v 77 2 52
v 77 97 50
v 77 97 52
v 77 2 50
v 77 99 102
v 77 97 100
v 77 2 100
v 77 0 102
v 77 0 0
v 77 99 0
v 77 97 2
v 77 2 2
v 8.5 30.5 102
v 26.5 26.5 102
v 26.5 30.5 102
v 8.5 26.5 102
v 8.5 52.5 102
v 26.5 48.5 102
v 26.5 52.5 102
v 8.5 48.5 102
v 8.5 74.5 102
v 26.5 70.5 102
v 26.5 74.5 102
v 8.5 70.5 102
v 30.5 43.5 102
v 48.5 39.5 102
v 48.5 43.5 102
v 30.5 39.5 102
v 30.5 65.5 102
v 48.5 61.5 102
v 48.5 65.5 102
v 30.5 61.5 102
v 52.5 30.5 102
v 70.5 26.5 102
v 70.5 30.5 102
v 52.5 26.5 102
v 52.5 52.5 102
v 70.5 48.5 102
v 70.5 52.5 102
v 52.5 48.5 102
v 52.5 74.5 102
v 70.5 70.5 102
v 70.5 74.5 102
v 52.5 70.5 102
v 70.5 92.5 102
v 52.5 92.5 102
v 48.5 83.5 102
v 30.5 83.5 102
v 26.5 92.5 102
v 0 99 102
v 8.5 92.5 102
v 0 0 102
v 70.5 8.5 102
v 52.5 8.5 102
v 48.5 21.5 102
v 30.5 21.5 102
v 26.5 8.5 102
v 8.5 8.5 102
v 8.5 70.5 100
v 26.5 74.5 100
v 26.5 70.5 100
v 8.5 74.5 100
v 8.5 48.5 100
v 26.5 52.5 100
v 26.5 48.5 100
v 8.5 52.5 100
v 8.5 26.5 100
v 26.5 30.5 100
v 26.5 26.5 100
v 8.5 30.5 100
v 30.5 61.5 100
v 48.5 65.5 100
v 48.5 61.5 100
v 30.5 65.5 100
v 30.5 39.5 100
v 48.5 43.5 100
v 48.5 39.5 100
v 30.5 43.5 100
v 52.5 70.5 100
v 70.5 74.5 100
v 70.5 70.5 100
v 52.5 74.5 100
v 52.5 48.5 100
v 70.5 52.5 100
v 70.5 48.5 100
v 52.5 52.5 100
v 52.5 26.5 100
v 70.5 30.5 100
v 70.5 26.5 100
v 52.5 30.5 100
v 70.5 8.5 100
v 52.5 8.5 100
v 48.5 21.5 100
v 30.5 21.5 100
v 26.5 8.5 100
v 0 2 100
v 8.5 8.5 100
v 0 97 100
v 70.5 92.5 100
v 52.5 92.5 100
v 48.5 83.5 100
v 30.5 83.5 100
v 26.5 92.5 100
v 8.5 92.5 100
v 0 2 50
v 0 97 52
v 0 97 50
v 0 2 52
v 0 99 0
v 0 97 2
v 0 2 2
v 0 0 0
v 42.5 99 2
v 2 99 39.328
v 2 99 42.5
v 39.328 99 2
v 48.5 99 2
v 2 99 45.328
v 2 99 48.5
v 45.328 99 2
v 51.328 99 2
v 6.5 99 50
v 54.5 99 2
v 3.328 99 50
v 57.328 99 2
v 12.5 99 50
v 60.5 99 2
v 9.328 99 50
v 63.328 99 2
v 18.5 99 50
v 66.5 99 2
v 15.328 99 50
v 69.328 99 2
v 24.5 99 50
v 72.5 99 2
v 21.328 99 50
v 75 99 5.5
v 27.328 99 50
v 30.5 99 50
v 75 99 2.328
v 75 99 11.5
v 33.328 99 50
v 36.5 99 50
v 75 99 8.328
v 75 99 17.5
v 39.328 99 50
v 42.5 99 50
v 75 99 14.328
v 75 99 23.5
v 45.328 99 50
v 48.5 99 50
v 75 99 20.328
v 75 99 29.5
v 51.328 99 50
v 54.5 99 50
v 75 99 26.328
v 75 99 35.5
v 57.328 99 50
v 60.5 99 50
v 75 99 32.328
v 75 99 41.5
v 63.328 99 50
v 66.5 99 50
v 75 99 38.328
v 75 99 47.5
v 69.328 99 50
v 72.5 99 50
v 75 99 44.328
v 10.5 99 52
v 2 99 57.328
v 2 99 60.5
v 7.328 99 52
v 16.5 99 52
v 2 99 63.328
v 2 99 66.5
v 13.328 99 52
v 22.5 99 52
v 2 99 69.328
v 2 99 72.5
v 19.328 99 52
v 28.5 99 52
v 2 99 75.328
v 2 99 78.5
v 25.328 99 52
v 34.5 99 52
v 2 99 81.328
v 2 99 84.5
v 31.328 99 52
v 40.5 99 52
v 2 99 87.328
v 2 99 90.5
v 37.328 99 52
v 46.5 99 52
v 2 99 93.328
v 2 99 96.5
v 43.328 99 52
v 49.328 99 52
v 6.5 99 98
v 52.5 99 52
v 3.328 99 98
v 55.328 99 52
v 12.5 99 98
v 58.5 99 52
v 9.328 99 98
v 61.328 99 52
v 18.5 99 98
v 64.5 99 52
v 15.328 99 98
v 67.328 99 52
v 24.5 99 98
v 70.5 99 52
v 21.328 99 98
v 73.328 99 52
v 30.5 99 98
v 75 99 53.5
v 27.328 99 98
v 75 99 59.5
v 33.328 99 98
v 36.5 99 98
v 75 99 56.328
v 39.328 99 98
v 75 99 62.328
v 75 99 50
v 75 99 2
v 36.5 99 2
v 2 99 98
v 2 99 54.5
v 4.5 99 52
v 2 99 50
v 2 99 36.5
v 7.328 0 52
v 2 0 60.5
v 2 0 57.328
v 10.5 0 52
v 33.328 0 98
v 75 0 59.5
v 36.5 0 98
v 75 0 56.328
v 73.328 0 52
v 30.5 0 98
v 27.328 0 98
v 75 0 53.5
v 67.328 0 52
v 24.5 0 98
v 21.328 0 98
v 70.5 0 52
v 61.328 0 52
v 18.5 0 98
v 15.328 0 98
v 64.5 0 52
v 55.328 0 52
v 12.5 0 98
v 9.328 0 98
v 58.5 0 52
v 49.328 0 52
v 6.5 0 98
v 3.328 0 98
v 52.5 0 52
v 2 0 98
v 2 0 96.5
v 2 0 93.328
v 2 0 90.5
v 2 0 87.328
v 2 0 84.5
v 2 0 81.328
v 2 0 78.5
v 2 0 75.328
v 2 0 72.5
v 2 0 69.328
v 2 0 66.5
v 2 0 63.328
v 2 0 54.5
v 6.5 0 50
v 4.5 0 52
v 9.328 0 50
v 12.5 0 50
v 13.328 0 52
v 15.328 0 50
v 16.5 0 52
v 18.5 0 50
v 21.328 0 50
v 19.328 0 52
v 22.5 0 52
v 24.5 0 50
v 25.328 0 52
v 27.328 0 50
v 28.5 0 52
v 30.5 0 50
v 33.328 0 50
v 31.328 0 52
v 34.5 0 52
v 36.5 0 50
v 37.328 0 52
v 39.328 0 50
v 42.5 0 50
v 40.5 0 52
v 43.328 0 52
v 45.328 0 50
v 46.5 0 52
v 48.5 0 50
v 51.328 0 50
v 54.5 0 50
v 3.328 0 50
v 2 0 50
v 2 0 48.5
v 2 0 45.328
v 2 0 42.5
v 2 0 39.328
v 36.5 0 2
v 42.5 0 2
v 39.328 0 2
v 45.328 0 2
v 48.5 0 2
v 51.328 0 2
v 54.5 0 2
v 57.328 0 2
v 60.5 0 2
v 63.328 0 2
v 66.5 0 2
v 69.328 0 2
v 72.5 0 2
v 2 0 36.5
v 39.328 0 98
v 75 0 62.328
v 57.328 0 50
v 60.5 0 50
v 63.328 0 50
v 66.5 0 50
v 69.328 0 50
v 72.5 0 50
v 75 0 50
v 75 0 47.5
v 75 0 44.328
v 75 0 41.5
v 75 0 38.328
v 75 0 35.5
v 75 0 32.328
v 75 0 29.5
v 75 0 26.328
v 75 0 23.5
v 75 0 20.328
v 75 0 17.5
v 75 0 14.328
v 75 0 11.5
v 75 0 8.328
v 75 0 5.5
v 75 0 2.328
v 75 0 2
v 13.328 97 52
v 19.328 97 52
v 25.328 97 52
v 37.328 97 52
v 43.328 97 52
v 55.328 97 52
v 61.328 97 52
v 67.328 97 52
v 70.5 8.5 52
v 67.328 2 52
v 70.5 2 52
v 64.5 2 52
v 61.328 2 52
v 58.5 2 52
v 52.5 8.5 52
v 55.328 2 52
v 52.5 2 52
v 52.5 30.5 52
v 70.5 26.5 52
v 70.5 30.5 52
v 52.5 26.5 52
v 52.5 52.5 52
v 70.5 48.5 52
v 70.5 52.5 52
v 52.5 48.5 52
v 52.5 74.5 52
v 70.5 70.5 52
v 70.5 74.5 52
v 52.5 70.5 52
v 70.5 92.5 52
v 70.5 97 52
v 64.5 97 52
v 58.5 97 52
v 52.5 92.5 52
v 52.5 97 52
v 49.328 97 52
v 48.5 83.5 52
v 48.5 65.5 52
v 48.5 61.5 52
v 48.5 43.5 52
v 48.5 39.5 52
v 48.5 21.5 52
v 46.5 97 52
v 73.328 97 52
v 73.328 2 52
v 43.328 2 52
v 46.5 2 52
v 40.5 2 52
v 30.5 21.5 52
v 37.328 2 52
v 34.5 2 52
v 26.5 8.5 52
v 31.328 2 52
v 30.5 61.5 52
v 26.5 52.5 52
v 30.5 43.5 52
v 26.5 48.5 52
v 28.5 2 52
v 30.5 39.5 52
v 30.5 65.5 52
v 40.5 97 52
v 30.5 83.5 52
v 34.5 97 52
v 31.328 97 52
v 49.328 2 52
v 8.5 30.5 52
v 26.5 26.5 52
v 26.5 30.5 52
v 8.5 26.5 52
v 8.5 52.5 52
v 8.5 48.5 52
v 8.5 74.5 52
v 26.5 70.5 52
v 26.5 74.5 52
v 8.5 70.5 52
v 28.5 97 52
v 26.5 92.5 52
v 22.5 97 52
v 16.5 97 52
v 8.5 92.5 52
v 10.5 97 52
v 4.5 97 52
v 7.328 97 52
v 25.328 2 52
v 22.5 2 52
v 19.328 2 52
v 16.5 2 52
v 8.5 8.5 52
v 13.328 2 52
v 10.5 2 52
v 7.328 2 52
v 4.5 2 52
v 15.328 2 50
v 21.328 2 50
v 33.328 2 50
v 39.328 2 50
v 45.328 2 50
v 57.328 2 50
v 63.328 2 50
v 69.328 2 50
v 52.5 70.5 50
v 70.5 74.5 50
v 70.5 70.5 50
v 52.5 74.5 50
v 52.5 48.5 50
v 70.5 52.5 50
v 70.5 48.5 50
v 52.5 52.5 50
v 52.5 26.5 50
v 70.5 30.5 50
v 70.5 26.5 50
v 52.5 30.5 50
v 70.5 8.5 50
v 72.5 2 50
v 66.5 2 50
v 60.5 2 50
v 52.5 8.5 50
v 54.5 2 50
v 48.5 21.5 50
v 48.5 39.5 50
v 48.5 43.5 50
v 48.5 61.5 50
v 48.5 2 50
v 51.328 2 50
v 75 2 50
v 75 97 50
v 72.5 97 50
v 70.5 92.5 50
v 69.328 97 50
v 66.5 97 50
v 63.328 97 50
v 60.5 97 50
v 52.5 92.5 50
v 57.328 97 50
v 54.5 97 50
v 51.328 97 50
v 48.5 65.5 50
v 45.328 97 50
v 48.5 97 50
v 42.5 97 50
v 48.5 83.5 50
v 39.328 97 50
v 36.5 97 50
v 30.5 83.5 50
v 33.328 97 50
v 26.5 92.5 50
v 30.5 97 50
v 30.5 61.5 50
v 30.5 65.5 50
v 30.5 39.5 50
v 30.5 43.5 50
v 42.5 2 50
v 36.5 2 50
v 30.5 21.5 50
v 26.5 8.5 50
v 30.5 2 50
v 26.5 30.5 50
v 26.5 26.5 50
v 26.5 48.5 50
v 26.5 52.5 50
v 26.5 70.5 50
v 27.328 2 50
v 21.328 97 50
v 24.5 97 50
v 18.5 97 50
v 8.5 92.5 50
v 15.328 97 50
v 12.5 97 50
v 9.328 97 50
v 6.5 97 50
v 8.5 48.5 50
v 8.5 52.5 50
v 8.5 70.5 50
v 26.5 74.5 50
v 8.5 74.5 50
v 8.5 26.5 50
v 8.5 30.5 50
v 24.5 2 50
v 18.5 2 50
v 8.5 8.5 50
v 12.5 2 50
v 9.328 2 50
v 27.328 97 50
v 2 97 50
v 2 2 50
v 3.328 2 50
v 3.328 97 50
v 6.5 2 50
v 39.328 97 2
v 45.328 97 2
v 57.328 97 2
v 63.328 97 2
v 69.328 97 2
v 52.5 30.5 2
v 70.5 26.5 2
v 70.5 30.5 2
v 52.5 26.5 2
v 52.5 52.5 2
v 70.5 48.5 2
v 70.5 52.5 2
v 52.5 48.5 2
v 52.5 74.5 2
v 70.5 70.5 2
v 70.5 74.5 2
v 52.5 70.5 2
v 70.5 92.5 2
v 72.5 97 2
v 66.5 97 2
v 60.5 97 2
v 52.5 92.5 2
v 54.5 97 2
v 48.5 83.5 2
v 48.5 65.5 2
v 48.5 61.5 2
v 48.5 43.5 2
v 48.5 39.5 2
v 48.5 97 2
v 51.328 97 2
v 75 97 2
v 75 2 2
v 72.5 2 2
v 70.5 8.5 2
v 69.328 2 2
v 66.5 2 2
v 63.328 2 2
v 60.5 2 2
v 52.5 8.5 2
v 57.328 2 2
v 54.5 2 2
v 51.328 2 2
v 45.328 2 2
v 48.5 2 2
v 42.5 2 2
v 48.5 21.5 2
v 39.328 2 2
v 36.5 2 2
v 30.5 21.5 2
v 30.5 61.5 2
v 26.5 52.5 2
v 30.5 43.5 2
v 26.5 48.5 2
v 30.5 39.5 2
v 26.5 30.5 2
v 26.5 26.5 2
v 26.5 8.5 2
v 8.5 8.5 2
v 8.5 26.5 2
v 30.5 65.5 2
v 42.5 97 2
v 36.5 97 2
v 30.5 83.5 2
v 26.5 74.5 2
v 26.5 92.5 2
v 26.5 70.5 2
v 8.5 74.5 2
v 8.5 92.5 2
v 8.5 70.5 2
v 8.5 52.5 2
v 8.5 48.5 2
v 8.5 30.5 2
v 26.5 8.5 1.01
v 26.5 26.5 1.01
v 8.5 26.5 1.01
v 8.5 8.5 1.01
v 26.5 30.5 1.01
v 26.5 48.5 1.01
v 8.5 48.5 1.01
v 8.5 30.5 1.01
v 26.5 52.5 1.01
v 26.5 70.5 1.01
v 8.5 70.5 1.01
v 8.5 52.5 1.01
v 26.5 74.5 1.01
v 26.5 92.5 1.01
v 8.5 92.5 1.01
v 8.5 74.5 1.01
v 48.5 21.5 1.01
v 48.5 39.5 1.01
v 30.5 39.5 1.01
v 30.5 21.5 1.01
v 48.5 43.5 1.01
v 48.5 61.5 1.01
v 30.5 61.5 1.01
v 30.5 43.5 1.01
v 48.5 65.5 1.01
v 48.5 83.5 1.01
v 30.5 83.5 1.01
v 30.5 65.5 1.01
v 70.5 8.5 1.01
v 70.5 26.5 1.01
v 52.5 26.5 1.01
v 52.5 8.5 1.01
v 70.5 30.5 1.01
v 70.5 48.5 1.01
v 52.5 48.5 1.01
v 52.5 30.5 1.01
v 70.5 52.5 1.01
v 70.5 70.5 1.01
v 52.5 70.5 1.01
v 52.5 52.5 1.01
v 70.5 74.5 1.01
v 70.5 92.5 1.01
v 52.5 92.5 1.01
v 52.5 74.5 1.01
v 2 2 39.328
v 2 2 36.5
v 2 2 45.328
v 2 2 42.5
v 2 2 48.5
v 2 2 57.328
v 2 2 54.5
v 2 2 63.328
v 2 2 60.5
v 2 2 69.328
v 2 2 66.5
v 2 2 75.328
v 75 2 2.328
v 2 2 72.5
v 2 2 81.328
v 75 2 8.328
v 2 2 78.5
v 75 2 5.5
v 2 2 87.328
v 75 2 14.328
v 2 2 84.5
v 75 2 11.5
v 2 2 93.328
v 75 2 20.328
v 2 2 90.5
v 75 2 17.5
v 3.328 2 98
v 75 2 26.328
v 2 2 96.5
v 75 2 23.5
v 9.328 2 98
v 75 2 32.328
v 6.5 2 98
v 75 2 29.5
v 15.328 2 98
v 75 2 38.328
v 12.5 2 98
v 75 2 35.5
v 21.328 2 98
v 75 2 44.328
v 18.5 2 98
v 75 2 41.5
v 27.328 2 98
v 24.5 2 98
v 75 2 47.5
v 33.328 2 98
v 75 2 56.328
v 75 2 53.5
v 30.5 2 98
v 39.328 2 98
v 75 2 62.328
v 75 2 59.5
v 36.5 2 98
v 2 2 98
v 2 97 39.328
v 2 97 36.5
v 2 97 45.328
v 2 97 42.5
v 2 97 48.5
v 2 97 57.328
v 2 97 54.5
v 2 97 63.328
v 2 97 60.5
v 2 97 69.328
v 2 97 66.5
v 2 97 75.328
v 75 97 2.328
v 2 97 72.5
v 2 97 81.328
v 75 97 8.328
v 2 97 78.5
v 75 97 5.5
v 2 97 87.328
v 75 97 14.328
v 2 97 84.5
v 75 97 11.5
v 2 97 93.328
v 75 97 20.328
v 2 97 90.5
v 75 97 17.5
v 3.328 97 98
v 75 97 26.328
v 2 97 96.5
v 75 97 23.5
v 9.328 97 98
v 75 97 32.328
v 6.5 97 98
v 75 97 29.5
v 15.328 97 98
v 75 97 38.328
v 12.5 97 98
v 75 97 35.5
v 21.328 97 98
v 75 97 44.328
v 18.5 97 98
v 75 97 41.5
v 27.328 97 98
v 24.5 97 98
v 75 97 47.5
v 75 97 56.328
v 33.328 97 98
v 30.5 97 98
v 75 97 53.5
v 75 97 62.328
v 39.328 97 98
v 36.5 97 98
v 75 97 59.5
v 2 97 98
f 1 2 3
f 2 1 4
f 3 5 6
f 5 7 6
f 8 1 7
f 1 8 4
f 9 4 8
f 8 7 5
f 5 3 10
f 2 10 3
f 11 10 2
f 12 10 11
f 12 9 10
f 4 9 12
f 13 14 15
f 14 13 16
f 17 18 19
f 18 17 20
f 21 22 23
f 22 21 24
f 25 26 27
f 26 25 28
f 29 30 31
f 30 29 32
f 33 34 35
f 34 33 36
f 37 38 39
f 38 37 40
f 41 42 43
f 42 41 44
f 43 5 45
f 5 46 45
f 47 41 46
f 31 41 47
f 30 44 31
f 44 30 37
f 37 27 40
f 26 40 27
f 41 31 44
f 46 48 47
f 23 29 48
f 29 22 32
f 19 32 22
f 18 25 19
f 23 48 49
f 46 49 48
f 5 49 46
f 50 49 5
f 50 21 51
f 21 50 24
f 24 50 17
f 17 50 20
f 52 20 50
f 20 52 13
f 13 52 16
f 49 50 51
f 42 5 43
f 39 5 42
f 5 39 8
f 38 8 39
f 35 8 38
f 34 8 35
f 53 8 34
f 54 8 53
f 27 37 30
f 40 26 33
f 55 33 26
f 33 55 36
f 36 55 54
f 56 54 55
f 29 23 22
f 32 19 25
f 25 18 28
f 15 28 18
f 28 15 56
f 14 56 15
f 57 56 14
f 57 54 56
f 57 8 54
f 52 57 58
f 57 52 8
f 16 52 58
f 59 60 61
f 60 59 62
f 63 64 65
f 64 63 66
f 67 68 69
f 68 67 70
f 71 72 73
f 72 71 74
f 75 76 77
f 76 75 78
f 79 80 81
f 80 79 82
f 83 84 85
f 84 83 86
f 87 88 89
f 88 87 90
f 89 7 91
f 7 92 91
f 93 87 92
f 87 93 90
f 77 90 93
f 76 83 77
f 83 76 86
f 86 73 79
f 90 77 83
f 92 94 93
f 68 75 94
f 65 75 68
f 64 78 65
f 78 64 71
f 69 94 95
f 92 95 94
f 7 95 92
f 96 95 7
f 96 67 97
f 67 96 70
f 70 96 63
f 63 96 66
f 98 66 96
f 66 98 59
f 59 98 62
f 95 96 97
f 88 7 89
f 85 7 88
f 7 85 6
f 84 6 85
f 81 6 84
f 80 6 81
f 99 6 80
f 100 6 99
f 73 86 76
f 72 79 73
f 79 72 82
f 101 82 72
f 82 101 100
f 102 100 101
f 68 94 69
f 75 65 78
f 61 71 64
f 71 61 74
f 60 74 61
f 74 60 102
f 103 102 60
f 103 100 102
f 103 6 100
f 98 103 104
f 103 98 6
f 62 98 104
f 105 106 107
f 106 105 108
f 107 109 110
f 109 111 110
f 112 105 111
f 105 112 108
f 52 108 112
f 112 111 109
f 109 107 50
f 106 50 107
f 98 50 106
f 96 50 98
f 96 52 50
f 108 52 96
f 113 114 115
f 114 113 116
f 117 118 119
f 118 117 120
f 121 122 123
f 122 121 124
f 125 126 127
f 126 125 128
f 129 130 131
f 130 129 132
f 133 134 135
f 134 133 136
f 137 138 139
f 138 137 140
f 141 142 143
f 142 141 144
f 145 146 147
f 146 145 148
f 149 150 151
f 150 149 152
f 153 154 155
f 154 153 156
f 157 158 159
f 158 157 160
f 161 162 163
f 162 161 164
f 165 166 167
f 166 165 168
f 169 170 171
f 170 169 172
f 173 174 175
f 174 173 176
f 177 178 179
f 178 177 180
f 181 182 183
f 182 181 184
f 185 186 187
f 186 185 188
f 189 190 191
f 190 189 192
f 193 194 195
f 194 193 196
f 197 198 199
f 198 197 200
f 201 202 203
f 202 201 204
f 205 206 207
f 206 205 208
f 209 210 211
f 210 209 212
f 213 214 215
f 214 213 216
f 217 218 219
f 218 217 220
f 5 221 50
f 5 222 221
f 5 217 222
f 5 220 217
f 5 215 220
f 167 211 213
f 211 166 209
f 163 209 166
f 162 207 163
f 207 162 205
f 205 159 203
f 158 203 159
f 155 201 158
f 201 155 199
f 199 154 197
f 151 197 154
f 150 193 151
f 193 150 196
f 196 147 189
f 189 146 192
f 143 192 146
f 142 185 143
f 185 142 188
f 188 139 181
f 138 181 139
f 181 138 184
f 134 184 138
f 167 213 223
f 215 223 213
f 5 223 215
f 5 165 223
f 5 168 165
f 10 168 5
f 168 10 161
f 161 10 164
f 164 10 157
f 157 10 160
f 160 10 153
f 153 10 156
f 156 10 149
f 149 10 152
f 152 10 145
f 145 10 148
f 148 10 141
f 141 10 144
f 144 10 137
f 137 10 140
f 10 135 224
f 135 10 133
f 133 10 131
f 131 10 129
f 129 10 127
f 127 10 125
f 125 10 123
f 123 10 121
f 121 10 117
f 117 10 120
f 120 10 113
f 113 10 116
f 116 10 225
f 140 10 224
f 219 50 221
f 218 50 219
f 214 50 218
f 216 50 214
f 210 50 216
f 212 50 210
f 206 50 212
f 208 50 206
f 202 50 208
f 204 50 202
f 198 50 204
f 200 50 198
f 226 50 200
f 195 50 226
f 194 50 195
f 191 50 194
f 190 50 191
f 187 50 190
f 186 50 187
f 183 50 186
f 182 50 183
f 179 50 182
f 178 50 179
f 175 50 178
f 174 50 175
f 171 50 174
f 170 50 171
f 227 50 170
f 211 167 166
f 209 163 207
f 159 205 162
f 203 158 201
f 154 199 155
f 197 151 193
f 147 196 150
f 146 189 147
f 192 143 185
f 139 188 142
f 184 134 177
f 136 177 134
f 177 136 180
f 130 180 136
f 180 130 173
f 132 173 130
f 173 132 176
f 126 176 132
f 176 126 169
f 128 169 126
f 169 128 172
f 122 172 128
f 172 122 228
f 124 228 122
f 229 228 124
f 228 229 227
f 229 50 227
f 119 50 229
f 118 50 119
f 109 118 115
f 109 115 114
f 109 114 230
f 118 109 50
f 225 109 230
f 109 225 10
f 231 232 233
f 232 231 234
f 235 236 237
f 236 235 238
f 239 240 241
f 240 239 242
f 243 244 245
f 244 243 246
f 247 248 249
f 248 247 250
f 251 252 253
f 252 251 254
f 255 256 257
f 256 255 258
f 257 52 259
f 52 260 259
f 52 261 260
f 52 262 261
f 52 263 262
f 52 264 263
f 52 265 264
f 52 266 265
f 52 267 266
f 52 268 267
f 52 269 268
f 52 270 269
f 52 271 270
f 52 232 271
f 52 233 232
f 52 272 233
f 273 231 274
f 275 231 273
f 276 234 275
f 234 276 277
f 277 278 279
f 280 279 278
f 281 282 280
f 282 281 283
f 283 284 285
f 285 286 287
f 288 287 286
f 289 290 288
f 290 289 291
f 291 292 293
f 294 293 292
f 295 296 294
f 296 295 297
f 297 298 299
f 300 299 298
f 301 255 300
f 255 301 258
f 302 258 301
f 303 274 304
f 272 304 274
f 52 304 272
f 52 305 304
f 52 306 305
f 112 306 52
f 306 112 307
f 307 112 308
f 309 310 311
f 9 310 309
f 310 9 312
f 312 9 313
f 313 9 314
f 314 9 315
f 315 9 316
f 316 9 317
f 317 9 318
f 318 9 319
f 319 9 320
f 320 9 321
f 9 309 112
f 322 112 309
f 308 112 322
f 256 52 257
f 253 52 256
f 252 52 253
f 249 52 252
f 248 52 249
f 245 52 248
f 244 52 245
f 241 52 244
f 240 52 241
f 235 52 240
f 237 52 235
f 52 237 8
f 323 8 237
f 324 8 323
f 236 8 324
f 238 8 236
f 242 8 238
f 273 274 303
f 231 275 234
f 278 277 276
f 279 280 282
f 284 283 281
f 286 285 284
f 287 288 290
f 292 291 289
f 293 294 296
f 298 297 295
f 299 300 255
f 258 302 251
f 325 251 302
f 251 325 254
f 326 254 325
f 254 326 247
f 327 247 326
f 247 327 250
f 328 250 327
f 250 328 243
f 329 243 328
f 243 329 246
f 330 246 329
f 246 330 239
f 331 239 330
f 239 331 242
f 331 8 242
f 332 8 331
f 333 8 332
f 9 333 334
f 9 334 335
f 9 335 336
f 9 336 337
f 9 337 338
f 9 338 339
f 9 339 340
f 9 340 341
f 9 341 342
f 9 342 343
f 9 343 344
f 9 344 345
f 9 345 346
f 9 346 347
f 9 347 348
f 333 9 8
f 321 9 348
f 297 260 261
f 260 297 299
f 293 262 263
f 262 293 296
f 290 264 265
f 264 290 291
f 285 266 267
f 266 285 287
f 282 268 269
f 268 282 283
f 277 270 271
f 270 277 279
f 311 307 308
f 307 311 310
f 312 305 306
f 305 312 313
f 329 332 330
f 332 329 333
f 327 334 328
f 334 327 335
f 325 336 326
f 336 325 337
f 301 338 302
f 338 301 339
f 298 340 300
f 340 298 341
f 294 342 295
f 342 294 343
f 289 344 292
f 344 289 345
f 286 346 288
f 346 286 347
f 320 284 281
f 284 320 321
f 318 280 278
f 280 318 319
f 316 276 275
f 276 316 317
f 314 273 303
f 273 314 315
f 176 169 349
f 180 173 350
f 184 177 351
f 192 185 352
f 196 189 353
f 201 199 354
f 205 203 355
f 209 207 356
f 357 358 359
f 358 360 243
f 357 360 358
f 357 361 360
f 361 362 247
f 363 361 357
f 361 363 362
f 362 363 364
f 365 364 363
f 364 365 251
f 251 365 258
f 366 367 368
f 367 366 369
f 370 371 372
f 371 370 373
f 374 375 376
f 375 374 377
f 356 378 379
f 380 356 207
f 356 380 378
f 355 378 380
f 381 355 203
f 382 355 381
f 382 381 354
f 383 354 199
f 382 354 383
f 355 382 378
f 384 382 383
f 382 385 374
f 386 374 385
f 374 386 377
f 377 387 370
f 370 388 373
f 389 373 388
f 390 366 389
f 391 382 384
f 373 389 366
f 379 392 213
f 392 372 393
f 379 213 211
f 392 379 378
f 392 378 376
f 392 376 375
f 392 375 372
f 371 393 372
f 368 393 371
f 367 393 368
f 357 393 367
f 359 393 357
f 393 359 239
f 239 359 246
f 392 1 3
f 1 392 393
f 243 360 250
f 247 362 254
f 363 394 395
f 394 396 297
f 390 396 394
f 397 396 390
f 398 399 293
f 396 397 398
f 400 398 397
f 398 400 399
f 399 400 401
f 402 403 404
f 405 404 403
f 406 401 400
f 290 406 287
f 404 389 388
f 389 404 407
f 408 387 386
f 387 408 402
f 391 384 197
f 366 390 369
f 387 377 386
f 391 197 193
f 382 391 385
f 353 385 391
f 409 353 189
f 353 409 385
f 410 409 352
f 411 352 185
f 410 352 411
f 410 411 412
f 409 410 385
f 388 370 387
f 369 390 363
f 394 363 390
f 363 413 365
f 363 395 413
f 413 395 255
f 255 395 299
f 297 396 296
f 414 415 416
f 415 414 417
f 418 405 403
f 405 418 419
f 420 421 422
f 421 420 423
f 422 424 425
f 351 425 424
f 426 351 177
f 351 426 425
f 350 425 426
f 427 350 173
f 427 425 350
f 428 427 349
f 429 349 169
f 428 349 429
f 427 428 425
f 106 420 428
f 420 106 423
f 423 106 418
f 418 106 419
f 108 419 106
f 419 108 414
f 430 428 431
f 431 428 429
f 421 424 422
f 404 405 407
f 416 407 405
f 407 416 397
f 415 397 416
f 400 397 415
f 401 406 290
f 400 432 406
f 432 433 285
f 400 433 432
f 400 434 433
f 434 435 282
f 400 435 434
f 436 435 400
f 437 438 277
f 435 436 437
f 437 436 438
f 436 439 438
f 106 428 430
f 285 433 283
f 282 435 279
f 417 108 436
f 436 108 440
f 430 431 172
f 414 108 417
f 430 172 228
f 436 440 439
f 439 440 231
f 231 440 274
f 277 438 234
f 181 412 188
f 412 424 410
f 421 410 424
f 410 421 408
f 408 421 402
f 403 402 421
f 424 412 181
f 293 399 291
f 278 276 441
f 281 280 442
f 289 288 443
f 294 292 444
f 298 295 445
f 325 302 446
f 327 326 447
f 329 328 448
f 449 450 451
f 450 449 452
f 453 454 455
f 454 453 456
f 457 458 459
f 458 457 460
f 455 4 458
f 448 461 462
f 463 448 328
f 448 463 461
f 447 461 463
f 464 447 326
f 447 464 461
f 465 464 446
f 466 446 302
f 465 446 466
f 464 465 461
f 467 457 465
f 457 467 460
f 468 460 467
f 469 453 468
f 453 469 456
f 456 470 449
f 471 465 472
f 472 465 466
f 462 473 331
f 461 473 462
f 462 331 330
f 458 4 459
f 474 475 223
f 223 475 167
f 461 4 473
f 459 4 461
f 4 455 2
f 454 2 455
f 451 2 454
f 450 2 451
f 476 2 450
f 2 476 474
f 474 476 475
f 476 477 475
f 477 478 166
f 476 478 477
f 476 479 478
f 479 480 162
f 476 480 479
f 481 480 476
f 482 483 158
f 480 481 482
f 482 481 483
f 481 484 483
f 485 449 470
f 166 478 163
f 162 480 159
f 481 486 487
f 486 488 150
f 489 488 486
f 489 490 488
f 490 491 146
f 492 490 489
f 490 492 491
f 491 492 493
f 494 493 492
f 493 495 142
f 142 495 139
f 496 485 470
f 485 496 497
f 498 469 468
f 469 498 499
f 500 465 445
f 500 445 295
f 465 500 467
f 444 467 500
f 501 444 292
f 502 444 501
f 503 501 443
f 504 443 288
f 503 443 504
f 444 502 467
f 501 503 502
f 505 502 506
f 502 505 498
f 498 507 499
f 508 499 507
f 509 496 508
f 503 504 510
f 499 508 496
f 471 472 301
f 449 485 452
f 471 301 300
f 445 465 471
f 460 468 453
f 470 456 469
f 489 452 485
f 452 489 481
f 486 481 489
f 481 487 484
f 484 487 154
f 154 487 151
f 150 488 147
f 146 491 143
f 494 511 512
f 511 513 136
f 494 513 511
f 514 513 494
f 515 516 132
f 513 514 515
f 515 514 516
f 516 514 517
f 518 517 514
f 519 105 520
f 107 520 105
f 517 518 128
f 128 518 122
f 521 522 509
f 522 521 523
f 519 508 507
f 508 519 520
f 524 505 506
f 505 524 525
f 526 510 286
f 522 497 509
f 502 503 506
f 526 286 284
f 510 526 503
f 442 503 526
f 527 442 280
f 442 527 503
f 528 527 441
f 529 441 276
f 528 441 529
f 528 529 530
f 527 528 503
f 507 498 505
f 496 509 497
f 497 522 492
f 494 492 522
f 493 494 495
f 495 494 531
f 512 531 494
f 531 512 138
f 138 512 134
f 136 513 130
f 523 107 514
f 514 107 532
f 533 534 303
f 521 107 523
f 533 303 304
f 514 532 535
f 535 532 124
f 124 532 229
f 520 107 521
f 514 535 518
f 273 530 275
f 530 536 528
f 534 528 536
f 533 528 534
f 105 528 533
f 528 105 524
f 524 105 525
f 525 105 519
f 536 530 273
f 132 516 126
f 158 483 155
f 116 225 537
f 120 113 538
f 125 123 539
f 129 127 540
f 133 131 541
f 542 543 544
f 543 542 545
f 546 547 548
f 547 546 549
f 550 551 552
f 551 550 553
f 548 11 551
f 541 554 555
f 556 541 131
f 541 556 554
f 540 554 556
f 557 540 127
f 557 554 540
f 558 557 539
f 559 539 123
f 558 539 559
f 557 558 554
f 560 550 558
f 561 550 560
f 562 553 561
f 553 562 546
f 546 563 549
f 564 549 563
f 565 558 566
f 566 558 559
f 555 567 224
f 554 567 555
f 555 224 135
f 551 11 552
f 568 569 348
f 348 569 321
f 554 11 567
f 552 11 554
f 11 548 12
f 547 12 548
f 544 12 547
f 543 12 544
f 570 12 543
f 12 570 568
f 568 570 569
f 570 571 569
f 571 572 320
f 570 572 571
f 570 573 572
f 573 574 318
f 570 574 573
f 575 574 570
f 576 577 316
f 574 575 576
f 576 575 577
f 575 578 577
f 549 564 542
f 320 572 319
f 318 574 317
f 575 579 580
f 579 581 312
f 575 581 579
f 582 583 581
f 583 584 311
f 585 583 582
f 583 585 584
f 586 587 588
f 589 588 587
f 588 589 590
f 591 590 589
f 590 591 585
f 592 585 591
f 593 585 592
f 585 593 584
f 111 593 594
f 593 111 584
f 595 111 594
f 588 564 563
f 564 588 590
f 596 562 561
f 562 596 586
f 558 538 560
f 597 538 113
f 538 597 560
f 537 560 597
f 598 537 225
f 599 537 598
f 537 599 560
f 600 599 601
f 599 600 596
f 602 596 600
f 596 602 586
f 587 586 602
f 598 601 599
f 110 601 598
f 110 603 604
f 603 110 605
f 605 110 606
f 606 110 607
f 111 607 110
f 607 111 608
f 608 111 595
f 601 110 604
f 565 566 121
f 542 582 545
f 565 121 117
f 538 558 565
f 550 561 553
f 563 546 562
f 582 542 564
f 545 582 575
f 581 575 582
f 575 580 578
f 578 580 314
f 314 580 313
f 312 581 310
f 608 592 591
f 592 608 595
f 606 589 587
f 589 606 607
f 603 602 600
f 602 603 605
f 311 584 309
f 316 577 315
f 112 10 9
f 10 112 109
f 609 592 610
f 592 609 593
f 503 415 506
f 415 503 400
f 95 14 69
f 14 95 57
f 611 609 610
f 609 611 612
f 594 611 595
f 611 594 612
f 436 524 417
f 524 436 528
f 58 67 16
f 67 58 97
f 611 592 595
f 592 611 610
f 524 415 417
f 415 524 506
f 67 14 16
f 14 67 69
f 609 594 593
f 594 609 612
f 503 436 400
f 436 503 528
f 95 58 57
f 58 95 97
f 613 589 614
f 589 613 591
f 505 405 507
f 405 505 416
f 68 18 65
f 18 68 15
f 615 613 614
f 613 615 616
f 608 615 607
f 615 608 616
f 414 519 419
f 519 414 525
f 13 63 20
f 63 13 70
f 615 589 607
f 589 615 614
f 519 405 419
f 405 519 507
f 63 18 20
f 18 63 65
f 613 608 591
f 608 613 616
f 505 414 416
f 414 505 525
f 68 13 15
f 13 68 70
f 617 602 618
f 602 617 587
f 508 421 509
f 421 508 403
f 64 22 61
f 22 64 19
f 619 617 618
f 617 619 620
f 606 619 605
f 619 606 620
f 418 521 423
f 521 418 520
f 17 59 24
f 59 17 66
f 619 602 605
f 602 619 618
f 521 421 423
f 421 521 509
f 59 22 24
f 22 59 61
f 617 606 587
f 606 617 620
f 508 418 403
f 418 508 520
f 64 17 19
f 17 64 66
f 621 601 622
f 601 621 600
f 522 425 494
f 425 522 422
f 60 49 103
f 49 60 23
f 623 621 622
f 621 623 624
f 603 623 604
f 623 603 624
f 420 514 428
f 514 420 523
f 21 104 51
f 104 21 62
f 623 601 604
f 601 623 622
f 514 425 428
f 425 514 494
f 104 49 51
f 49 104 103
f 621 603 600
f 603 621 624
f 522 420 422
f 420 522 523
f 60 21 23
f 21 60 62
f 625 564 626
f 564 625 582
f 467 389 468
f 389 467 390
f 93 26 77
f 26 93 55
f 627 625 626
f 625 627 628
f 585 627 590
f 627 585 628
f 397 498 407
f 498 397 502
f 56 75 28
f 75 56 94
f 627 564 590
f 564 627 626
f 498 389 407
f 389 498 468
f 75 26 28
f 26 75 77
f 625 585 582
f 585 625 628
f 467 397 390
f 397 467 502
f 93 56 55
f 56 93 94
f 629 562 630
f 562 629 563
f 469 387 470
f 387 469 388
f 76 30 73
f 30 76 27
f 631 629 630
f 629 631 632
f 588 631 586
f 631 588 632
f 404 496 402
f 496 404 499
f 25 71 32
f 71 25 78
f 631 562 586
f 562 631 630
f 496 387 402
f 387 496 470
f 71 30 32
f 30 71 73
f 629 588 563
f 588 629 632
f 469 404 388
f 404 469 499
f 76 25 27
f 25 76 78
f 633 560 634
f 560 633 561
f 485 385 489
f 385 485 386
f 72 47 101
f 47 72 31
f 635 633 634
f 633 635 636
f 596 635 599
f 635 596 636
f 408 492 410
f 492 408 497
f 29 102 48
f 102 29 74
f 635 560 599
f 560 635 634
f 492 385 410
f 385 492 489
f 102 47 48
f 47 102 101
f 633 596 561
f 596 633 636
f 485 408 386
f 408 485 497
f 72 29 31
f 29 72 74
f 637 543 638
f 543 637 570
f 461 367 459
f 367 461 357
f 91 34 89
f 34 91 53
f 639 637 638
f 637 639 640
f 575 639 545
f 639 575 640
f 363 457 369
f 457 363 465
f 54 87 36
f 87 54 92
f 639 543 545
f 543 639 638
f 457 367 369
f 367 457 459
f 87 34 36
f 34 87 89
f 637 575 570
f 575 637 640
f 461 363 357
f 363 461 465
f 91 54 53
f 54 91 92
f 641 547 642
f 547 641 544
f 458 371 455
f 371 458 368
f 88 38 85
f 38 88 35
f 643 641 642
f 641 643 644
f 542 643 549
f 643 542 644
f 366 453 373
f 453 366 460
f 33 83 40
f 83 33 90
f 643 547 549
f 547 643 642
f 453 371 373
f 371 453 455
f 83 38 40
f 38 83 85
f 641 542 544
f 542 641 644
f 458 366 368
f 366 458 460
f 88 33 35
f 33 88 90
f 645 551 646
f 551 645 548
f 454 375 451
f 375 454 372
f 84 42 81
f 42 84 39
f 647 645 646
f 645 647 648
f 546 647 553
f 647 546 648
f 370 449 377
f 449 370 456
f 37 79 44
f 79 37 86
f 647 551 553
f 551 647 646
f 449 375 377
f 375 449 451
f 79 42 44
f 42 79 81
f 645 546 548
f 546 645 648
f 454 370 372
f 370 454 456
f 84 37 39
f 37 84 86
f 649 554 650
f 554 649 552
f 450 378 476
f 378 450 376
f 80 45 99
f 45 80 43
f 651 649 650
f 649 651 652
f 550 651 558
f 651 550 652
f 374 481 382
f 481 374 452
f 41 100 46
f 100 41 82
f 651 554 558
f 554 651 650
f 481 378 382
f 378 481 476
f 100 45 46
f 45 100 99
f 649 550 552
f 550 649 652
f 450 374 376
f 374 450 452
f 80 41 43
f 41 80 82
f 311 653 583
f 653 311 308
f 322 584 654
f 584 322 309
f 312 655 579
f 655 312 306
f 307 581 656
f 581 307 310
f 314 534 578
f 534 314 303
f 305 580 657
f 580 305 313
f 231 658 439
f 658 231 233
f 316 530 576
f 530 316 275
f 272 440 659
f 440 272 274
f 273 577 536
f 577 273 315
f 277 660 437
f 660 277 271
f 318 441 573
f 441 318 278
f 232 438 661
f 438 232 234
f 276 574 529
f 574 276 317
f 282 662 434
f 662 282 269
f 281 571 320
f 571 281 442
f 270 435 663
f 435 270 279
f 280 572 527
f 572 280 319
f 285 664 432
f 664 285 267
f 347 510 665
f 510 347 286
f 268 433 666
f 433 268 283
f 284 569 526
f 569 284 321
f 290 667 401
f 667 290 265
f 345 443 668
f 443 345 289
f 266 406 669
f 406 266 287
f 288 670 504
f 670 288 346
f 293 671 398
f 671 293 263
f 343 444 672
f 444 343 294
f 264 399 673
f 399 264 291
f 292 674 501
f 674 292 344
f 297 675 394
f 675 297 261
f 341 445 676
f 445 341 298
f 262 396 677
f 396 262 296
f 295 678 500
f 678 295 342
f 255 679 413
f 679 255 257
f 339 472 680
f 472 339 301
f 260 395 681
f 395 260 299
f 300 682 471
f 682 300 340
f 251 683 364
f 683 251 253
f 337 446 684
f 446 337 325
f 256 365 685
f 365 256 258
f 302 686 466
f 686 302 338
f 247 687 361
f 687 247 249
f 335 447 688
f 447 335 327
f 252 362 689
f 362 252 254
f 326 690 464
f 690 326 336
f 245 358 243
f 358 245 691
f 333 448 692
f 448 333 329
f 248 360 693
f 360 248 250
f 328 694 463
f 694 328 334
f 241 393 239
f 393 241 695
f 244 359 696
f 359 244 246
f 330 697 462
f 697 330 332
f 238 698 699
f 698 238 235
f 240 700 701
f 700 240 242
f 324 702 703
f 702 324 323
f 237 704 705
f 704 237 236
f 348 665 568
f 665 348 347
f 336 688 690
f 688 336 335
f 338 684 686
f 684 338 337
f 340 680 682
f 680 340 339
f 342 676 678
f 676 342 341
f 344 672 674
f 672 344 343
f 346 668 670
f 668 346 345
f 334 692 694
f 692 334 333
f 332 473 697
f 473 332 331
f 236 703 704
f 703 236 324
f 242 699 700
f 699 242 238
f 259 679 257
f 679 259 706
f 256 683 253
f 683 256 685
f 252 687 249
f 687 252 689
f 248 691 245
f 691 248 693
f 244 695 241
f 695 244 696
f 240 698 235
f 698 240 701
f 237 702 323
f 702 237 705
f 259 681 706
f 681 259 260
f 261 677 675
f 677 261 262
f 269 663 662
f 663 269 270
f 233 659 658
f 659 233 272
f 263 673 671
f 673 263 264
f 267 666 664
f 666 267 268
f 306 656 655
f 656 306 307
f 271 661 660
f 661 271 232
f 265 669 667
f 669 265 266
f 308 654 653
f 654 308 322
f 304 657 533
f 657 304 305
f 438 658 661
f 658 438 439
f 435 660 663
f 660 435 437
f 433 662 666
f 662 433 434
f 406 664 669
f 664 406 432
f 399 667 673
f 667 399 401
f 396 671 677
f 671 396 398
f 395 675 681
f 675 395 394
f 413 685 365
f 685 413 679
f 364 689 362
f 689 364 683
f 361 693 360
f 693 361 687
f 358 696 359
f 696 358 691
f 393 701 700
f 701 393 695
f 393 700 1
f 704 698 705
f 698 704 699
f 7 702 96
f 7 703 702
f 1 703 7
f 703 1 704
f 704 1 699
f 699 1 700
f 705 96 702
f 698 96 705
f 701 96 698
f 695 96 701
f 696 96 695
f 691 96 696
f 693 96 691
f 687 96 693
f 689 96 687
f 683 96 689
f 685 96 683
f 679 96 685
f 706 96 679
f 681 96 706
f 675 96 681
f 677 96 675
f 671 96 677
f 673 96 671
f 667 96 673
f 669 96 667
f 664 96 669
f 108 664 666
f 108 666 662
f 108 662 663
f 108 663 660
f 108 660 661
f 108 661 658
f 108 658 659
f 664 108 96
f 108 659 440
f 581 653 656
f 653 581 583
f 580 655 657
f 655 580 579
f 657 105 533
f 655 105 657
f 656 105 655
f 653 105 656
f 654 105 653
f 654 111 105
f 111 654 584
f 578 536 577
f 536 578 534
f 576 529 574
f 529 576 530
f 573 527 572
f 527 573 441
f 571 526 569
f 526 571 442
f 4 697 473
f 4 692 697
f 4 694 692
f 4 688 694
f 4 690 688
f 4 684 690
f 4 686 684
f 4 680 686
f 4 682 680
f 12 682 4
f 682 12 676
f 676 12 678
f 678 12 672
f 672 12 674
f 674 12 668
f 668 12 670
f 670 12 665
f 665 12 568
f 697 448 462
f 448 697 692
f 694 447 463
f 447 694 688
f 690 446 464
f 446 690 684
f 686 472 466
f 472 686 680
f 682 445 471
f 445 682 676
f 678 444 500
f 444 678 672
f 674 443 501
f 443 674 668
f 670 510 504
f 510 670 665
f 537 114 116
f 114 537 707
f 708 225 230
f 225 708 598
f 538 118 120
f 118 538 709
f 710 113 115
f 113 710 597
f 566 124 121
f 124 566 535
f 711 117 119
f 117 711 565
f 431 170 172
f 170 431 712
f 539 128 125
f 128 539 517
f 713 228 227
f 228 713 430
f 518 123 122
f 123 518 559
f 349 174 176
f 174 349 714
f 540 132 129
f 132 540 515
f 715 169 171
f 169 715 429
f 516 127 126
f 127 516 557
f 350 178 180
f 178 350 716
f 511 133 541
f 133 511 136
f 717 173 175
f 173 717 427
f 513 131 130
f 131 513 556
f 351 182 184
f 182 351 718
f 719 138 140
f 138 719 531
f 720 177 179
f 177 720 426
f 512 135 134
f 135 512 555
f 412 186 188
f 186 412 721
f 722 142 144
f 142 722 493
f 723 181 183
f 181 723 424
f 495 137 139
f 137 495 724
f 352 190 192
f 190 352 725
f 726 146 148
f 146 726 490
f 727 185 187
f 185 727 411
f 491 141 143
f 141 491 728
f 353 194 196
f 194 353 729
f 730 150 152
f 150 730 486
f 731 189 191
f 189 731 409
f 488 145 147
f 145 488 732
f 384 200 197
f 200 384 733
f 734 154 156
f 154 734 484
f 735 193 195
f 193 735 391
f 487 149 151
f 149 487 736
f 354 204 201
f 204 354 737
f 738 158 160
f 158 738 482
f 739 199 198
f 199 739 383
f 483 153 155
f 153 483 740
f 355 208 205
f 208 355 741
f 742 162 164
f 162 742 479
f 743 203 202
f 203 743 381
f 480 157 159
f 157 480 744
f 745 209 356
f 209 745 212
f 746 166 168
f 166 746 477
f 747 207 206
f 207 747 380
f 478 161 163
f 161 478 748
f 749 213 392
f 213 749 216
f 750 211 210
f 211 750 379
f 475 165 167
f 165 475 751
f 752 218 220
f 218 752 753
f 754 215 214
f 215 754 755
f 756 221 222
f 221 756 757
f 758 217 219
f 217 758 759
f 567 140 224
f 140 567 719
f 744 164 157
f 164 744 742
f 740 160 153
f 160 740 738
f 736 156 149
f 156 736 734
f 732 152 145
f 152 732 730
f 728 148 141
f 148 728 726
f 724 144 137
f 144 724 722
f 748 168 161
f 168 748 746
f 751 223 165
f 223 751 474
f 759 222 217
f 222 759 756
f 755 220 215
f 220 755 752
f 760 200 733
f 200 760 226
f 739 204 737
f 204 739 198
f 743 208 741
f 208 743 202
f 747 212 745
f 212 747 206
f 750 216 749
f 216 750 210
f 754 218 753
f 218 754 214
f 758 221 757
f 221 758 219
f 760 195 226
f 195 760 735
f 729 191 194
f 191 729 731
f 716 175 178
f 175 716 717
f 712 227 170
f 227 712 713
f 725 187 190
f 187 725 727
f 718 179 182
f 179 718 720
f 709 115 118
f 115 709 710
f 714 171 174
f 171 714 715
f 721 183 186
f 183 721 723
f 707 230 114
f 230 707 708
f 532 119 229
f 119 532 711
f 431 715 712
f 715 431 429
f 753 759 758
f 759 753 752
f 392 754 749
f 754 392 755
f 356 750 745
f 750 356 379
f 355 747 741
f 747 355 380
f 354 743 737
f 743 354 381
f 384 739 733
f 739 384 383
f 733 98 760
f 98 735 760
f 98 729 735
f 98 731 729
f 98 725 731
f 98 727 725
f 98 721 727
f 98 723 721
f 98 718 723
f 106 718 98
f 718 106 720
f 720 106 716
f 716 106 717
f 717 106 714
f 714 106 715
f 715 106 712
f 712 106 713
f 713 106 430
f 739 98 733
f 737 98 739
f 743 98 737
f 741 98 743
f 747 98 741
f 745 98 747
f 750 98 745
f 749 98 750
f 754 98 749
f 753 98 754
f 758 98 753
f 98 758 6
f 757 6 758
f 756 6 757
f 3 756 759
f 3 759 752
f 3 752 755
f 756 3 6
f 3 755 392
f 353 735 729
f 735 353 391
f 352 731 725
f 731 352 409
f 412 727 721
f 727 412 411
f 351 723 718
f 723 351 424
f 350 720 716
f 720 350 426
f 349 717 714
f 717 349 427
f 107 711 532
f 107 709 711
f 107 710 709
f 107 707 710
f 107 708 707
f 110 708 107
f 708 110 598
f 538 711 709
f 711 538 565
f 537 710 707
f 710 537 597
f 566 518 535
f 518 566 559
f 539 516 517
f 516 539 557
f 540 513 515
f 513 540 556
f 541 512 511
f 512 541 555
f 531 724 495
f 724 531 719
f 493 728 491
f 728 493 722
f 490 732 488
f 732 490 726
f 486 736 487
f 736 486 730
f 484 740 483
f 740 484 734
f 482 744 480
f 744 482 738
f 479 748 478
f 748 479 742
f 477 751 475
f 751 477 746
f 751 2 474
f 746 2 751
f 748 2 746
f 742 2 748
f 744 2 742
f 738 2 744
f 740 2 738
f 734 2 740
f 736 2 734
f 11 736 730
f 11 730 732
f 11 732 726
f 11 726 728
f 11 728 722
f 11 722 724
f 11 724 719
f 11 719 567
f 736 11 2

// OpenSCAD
// Number of Tubes at X axis
TubesX = 3;
// Number of Tubes at Y axis
TubesY = 4;
// Tube Height
TubeHeight = 150;
// Tube diameter
TubeDiameter = 16;
// Hole diameter
HoleDiameter = 18;
// Top table height
HolderHeight = 100;
// Walls thickness
HolderThickness = 2; // [2:50]
// Zero to remove
SecondTableHeight = 50;
// Inter tube space
InterTubeSpace = 4; // [2:50]
// Alternate even rows positions ?
AlternateEvenRows = "Yes"; // [Yes,No]
// Draw Sample Tubes?
DrawSampleTubes = "No";  // [Yes,No]
// Make half hole at bottom table?
MakeHalfHoleBottom = "Yes"; // [Yes,No]
DrawHatchOnWalls = "Yes"; // [Yes,No]
MakeSquaredHoles = "Yes"; // [Yes,No]
       
/* [HIDDEN] */
$fn=50;
bAlternateEvenRows = "Yes" == AlternateEvenRows; // Alternate even rows positions
bDrawSampleTubes = "Yes" == DrawSampleTubes;  // Draw Sample Tubes?
bMakeHalfHoleBottom ="Yes" == MakeHalfHoleBottom; // Make half hole at bottmo table?

modelX = (TubesX+0.5)*(HoleDiameter+InterTubeSpace);
modelY = (TubesY+0.5)*(HoleDiameter+InterTubeSpace);

holderThickness = HolderThickness < 2 ? 2: HolderThickness;

//wall();
All();

module All(){
    difference()
    {
        union(){
            translate([0,0,HolderHeight]) table();
            translate([0,0,SecondTableHeight]) table();
            table();
        }
        z = bMakeHalfHoleBottom ? (holderThickness/2) : 0;
        translate([0,0,0.01 + holderThickness-z]) // Better Drawing
            DrawTubes();
    }
    wall();
    translate([0,
              modelY-holderThickness,
              0])
        wall();
    if(bDrawSampleTubes)
        DrawTubes(TubeDiameter);
}
module wall(){
    if("Yes" == DrawHatchOnWalls){
        difference(){
            cube([modelX,
                  holderThickness,
                  HolderHeight]);
            intersection(){
                wallPatternRestriction();
                patternDiagonal();
            }
        }    
    }else{
        cube([modelX,
              holderThickness,
              HolderHeight]);
    }
}
module wallPatternRestriction(){
    translate([holderThickness,-holderThickness*0.5,holderThickness])
        cube([modelX-2*holderThickness,
              holderThickness*2,
              HolderHeight-2*holderThickness]);
}
module patternDiagonal(){
    for(i = [0:holderThickness*3:HolderHeight]){
        translate([0,-1,modelX/2+i]) rotate([0,45,0])
            cube([modelX*2,holderThickness*2,holderThickness]);
    }
}
module table(){
    cube([modelX,
          modelY,
          holderThickness]);
}
module DrawTubes(Diameter = HoleDiameter){
    color("lightblue")
    for(x = [1:TubesX])
    {    
        alternate = (x%2 == 0 && bAlternateEvenRows);
        for(y = [1: alternate ? TubesY-1:TubesY])
        {            
            offsetY = alternate ? (InterTubeSpace+HoleDiameter/2) : 0;
            
            if("Yes" == MakeSquaredHoles){
                translate([x*(HoleDiameter+InterTubeSpace)-HoleDiameter*0.75,
                       offsetY+y*(HoleDiameter+InterTubeSpace)-HoleDiameter*0.75,0])
                cube([Diameter,Diameter,TubeHeight]);
            }else{
                translate([x*(HoleDiameter+InterTubeSpace)-HoleDiameter/4,
                       offsetY+y*(HoleDiameter+InterTubeSpace)-HoleDiameter/4,0])
                cylinder(r = Diameter/2,h=TubeHeight);
            }
        }
    }
}
